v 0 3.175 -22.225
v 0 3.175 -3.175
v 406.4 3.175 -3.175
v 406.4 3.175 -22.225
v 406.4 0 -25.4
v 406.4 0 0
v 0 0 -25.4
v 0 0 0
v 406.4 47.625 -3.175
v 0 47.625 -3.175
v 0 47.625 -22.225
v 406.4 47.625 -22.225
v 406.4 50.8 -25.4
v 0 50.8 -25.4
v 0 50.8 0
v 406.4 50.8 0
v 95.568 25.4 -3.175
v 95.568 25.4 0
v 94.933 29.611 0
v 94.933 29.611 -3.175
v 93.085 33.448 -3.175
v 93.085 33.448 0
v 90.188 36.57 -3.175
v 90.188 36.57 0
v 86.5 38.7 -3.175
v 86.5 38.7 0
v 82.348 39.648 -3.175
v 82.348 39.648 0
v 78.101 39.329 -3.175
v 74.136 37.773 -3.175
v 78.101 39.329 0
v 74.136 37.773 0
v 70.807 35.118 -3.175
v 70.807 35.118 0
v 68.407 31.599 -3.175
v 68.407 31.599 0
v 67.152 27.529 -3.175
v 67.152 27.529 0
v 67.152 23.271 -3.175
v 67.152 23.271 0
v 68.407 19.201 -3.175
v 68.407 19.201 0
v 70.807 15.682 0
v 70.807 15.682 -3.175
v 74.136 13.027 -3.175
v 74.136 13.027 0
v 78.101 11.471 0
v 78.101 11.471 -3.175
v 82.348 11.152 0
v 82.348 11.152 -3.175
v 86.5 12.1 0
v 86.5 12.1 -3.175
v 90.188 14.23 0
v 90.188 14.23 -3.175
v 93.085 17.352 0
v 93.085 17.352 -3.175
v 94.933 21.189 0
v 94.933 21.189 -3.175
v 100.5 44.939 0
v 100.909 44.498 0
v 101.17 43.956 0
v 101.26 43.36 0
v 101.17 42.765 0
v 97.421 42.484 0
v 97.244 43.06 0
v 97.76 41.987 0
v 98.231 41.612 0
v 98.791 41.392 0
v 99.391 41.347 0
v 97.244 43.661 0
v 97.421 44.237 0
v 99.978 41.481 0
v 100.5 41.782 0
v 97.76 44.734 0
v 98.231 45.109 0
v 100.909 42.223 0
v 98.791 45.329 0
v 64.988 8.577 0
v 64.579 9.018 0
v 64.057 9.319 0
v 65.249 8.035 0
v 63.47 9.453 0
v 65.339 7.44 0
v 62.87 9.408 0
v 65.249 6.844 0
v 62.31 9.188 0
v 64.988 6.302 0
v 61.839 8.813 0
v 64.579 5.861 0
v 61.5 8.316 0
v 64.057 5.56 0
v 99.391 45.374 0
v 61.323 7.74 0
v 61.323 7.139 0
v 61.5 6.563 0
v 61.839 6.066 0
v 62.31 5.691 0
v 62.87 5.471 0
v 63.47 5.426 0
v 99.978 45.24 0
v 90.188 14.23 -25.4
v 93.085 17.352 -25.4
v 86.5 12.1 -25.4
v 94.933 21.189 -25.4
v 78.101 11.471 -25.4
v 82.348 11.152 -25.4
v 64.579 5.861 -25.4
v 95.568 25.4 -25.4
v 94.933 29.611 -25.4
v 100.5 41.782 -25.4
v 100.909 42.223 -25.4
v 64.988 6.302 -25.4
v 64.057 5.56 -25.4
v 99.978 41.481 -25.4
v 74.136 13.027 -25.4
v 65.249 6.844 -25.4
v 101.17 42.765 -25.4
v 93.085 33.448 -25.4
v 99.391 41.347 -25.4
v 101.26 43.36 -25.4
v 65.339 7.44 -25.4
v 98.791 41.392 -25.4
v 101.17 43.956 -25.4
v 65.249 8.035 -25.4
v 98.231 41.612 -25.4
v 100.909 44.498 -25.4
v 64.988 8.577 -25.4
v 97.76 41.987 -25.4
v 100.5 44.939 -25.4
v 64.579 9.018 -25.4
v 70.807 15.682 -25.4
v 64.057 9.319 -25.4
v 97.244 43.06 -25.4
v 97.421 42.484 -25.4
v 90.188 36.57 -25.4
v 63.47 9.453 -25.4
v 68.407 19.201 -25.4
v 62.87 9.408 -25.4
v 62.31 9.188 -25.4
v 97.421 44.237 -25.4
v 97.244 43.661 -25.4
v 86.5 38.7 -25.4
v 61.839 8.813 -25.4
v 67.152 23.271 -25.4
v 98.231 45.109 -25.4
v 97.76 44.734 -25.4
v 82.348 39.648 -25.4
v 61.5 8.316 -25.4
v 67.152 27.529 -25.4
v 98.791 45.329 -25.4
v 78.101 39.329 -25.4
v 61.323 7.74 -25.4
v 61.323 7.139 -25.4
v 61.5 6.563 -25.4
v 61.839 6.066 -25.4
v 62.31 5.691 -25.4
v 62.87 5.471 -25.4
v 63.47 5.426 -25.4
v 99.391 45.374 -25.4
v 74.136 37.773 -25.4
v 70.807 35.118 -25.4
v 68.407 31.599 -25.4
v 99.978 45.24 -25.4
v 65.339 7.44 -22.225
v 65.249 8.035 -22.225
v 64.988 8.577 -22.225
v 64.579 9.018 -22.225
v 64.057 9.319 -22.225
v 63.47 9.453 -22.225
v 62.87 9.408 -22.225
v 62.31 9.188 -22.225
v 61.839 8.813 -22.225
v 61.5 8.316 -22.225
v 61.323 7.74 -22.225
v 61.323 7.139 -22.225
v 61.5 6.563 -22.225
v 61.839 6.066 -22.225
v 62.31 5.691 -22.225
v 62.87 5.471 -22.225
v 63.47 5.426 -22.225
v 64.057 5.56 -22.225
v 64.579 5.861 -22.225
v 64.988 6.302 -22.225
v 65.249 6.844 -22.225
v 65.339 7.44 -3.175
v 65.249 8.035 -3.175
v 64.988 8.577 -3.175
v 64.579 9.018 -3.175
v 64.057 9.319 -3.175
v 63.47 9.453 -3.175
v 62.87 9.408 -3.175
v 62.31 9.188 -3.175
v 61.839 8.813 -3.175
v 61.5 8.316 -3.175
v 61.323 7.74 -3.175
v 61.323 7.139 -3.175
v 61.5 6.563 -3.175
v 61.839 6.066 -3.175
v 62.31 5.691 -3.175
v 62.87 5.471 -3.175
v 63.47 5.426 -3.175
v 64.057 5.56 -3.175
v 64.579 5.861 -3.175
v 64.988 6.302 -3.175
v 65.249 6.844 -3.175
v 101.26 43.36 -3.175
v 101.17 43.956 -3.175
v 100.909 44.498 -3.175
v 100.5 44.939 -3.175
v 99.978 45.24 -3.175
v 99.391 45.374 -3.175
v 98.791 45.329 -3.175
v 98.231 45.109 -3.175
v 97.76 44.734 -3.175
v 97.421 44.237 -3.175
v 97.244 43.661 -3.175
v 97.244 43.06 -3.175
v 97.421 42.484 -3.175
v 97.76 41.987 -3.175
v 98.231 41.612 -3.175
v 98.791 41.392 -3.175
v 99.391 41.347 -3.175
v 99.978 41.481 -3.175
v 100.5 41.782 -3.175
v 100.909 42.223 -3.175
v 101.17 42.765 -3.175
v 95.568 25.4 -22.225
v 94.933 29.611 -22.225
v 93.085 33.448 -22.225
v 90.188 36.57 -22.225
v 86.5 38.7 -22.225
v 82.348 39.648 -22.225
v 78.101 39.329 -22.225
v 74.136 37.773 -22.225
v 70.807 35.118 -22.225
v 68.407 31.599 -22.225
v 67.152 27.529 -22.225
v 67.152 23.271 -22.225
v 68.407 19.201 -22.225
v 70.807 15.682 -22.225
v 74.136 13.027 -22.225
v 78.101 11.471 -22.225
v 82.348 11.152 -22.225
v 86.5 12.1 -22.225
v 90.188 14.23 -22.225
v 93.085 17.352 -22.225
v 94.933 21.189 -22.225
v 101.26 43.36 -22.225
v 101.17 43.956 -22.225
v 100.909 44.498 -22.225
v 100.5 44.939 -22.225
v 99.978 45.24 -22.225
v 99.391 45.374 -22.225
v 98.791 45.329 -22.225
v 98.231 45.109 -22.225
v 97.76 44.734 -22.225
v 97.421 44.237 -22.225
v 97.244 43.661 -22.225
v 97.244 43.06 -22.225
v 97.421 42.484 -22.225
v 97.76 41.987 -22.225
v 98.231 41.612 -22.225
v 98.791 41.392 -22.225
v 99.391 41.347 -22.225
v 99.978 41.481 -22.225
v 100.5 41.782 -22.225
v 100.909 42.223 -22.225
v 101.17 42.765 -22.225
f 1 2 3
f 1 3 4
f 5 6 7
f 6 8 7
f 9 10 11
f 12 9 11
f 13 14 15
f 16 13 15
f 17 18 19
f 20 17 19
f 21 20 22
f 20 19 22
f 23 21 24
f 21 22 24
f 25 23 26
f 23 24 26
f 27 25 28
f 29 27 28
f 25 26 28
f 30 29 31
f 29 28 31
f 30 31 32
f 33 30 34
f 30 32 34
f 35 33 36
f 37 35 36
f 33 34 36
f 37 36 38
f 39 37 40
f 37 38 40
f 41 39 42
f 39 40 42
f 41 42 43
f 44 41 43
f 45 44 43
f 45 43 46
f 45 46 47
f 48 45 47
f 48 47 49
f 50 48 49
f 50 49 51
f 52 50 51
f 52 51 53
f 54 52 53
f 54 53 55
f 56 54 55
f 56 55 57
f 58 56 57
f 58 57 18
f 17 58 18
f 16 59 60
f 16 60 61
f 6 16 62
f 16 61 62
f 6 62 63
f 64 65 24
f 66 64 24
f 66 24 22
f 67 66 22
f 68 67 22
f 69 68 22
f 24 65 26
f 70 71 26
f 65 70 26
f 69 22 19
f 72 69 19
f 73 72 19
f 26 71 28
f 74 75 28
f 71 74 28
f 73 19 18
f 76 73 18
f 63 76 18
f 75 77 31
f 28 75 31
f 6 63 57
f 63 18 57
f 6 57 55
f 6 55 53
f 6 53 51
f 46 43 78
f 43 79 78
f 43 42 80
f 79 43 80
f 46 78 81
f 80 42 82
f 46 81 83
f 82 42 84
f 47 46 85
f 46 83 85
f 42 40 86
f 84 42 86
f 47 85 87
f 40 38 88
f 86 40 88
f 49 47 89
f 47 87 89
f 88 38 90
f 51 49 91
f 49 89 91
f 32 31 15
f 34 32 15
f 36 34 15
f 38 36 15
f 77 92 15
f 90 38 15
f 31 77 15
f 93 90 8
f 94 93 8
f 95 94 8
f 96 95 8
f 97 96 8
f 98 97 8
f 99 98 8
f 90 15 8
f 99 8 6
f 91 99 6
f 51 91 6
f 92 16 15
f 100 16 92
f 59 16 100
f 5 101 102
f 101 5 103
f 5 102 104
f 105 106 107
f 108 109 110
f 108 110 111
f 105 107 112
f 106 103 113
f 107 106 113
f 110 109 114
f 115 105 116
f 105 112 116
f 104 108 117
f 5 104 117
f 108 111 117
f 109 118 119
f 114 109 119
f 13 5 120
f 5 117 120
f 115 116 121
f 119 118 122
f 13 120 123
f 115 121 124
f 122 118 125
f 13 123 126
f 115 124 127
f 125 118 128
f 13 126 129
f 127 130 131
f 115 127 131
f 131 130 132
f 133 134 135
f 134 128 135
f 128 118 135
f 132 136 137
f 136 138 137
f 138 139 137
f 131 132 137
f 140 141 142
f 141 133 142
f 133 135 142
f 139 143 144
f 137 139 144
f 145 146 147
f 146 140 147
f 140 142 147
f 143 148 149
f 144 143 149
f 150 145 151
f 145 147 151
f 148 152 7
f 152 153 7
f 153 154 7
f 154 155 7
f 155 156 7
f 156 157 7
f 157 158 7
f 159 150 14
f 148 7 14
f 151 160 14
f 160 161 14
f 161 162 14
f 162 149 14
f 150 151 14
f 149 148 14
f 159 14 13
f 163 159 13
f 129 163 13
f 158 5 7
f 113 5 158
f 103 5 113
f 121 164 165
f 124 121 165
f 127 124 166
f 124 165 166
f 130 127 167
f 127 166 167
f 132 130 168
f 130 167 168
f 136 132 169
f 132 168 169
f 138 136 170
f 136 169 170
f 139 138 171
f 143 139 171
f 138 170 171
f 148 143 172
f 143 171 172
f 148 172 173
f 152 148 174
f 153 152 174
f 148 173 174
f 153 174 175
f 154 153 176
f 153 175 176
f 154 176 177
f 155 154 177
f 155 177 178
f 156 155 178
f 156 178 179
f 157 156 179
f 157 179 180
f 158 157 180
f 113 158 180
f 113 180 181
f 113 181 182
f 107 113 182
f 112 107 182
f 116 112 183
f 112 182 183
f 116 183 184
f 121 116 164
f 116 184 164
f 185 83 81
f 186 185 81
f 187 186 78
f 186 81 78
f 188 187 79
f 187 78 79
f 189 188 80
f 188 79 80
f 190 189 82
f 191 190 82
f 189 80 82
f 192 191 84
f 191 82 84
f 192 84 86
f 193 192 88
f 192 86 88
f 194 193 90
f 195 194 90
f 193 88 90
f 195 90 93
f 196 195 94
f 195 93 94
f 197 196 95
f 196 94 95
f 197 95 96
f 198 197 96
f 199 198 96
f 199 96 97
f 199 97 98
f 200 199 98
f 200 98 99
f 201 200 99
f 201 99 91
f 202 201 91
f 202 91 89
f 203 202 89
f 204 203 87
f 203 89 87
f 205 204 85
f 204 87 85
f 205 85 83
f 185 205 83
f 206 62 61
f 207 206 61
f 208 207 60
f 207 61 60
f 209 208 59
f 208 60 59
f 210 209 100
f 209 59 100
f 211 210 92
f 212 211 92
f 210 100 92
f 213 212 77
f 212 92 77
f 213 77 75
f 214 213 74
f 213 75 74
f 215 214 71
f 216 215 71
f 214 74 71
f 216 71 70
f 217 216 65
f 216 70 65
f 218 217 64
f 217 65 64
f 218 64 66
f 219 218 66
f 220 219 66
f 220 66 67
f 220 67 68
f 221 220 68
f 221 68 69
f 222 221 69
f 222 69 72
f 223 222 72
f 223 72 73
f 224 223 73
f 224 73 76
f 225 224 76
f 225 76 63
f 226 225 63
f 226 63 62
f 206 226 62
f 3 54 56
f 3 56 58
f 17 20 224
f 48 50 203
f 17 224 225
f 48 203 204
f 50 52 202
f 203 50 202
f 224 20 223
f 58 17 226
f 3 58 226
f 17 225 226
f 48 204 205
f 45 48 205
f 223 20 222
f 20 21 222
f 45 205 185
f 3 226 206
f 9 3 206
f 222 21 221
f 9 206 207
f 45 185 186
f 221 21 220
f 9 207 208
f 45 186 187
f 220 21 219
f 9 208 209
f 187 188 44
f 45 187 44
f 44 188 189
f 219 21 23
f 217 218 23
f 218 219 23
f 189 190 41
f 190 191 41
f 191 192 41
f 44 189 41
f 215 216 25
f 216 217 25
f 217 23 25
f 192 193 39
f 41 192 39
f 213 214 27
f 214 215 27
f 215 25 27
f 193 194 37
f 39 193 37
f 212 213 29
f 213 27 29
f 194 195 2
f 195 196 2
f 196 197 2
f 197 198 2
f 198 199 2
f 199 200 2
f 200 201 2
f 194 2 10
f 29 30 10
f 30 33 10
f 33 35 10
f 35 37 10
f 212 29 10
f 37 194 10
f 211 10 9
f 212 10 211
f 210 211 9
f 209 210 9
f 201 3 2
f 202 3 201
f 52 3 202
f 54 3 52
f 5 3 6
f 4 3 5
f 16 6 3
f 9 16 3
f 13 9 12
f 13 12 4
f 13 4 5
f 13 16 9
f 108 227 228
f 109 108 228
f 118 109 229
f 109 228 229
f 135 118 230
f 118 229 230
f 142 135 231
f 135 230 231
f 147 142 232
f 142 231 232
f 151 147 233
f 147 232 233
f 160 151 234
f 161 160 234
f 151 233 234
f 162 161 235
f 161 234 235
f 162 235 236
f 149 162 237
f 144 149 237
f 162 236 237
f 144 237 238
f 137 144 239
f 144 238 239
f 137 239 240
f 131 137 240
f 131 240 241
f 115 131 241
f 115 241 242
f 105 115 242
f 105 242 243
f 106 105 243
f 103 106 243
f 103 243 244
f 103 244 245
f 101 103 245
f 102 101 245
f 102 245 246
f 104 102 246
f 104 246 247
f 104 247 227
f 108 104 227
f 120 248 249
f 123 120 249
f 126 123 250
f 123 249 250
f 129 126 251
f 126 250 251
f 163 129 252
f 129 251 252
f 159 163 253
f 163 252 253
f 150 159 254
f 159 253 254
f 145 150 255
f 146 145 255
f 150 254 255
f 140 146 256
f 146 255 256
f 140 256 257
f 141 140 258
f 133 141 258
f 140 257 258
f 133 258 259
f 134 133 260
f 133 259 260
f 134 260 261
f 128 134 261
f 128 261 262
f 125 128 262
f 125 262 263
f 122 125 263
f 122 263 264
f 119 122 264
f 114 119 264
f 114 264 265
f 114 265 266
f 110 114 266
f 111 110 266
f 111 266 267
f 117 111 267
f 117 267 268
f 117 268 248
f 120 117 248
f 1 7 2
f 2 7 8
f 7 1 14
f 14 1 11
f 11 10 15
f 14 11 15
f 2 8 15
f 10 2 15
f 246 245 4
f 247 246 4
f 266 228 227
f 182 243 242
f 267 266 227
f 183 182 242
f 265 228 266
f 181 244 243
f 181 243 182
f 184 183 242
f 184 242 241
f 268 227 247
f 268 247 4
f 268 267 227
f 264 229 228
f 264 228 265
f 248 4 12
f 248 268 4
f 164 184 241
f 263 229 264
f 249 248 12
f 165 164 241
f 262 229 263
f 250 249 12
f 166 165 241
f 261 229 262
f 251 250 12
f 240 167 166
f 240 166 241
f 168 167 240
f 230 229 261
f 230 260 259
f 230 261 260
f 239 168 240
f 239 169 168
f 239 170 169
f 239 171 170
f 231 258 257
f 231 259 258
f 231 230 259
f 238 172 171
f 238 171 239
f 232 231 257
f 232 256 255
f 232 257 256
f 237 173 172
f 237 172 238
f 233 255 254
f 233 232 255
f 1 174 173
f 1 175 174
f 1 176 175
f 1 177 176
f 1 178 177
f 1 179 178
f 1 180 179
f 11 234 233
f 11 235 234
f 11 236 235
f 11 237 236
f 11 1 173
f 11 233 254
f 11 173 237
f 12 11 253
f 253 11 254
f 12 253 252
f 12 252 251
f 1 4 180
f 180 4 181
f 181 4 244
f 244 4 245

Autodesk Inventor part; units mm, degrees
ref_plane "YZ Plane" through (0, 0, 0) normal (1, 0, 0) x (0, 1, 0)
ref_plane "XZ Plane" through (0, 0, 0) normal (0, 1, 0) x (-1, 0, 0)
ref_plane "XY Plane" through (0, 0, 0) normal (0, 0, 1) x (1, 0, 0)
sketch "Sketch1" plane through (0, 0, 0) normal (1, 0, 0) x (0, 1, 0)
  line L0 (0, 0) -> (50.8, 0)
  line L1 (50.8, 0) -> (50.8, -25.4)
  line L2 (50.8, -25.4) -> (0, -25.4)
  line L3 (0, -25.4) -> (0, 0)
  line L4 (47.625, -22.225) -> (47.625, -3.175)
  line L5 (47.625, -3.175) -> (3.175, -3.175)
  line L6 (3.175, -3.175) -> (3.175, -22.225)
  line L7 (3.175, -22.225) -> (47.625, -22.225)
  dimension "d0" = 50.8
  dimension "d1" = 25.4
  dimension "d2" = 3.175
extrude "Extrusion1" add sketch "Sketch1" along normal blind 177.8
sketch "Sketch2" plane through (0, 0, 0) normal (0, 0, 1) x (1, 0, 0)
  line L0 (0, 0) -> (0, 50.8) projected
  circle A0 centre (81.28, 25.4) radius 14.2875
  line L1 (151.13, 25.4) -> (175.8823, 25.4) construction
  line L2 (81.28, 25.4) -> (106.68, 25.4) construction
  circle A1 centre (99.2405, 43.3605) radius 2.0193
  circle A2 centre (63.3195, 7.4395) radius 2.0193
  circle A3 centre (63.3195, 7.4395) radius 2.0193
  circle A4 centre (99.2405, 43.3605) radius 2.0193
  dimension "d5" = 81.28
  dimension "d6" = 28.575
  dimension "d19" = 4.0386
  dimension "d20" = 4.0386
extrude "Extrusion2" cut sketch "Sketch2" against normal blind 25.4 contours A0
sketch "Sketch3" plane through (177.8, 0, 0) normal (1, 0, 0) x (0, 0, -1)
  line L0 (0, 50.8) -> (0, 0) projected
  line L1 (25.4, 0) -> (25.4, 50.8) projected
  line L2 (0, 0) -> (25.4, 0)
  line L3 (25.4, 0) -> (25.4, 50.8)
  line L4 (25.4, 50.8) -> (0, 50.8)
  line L5 (0, 50.8) -> (0, 0)
  line L6 (3.175, 3.175) -> (3.175, 47.625) projected
  line L7 (3.175, 47.625) -> (22.225, 47.625) projected
  line L8 (3.175, 3.175) -> (22.225, 3.175)
  line L9 (22.225, 3.175) -> (22.225, 47.625)
  line L10 (22.225, 47.625) -> (3.175, 47.625)
  line L11 (3.175, 47.625) -> (3.175, 3.175)
extrude "Extrusion3" add sketch "Sketch3" along normal blind 228.6
sketch "Sketch4" plane through (0, 0, 0) normal (0, 0, 1) x (1, 0, 0)
  circle A0 centre (81.28, 25.4) radius 14.2875 projected
  line L0 (0, 50.8) -> (406.4, 50.8) projected
  line L1 (81.28, 25.4) -> (106.68, 25.4) construction
  circle A1 centre (99.2405, 43.3605) radius 2.0193
  circle A2 centre (63.3195, 7.4395) radius 2.0193
  point P0 (0, 0)
  dimension "d22" = 4.0386
  dimension "d23" = 4.0386
extrude "Extrusion4" cut sketch "Sketch4" against normal blind 228.6 contours A1 | A2
properties part number "liftCimBar" material "Aluminum 6061"
